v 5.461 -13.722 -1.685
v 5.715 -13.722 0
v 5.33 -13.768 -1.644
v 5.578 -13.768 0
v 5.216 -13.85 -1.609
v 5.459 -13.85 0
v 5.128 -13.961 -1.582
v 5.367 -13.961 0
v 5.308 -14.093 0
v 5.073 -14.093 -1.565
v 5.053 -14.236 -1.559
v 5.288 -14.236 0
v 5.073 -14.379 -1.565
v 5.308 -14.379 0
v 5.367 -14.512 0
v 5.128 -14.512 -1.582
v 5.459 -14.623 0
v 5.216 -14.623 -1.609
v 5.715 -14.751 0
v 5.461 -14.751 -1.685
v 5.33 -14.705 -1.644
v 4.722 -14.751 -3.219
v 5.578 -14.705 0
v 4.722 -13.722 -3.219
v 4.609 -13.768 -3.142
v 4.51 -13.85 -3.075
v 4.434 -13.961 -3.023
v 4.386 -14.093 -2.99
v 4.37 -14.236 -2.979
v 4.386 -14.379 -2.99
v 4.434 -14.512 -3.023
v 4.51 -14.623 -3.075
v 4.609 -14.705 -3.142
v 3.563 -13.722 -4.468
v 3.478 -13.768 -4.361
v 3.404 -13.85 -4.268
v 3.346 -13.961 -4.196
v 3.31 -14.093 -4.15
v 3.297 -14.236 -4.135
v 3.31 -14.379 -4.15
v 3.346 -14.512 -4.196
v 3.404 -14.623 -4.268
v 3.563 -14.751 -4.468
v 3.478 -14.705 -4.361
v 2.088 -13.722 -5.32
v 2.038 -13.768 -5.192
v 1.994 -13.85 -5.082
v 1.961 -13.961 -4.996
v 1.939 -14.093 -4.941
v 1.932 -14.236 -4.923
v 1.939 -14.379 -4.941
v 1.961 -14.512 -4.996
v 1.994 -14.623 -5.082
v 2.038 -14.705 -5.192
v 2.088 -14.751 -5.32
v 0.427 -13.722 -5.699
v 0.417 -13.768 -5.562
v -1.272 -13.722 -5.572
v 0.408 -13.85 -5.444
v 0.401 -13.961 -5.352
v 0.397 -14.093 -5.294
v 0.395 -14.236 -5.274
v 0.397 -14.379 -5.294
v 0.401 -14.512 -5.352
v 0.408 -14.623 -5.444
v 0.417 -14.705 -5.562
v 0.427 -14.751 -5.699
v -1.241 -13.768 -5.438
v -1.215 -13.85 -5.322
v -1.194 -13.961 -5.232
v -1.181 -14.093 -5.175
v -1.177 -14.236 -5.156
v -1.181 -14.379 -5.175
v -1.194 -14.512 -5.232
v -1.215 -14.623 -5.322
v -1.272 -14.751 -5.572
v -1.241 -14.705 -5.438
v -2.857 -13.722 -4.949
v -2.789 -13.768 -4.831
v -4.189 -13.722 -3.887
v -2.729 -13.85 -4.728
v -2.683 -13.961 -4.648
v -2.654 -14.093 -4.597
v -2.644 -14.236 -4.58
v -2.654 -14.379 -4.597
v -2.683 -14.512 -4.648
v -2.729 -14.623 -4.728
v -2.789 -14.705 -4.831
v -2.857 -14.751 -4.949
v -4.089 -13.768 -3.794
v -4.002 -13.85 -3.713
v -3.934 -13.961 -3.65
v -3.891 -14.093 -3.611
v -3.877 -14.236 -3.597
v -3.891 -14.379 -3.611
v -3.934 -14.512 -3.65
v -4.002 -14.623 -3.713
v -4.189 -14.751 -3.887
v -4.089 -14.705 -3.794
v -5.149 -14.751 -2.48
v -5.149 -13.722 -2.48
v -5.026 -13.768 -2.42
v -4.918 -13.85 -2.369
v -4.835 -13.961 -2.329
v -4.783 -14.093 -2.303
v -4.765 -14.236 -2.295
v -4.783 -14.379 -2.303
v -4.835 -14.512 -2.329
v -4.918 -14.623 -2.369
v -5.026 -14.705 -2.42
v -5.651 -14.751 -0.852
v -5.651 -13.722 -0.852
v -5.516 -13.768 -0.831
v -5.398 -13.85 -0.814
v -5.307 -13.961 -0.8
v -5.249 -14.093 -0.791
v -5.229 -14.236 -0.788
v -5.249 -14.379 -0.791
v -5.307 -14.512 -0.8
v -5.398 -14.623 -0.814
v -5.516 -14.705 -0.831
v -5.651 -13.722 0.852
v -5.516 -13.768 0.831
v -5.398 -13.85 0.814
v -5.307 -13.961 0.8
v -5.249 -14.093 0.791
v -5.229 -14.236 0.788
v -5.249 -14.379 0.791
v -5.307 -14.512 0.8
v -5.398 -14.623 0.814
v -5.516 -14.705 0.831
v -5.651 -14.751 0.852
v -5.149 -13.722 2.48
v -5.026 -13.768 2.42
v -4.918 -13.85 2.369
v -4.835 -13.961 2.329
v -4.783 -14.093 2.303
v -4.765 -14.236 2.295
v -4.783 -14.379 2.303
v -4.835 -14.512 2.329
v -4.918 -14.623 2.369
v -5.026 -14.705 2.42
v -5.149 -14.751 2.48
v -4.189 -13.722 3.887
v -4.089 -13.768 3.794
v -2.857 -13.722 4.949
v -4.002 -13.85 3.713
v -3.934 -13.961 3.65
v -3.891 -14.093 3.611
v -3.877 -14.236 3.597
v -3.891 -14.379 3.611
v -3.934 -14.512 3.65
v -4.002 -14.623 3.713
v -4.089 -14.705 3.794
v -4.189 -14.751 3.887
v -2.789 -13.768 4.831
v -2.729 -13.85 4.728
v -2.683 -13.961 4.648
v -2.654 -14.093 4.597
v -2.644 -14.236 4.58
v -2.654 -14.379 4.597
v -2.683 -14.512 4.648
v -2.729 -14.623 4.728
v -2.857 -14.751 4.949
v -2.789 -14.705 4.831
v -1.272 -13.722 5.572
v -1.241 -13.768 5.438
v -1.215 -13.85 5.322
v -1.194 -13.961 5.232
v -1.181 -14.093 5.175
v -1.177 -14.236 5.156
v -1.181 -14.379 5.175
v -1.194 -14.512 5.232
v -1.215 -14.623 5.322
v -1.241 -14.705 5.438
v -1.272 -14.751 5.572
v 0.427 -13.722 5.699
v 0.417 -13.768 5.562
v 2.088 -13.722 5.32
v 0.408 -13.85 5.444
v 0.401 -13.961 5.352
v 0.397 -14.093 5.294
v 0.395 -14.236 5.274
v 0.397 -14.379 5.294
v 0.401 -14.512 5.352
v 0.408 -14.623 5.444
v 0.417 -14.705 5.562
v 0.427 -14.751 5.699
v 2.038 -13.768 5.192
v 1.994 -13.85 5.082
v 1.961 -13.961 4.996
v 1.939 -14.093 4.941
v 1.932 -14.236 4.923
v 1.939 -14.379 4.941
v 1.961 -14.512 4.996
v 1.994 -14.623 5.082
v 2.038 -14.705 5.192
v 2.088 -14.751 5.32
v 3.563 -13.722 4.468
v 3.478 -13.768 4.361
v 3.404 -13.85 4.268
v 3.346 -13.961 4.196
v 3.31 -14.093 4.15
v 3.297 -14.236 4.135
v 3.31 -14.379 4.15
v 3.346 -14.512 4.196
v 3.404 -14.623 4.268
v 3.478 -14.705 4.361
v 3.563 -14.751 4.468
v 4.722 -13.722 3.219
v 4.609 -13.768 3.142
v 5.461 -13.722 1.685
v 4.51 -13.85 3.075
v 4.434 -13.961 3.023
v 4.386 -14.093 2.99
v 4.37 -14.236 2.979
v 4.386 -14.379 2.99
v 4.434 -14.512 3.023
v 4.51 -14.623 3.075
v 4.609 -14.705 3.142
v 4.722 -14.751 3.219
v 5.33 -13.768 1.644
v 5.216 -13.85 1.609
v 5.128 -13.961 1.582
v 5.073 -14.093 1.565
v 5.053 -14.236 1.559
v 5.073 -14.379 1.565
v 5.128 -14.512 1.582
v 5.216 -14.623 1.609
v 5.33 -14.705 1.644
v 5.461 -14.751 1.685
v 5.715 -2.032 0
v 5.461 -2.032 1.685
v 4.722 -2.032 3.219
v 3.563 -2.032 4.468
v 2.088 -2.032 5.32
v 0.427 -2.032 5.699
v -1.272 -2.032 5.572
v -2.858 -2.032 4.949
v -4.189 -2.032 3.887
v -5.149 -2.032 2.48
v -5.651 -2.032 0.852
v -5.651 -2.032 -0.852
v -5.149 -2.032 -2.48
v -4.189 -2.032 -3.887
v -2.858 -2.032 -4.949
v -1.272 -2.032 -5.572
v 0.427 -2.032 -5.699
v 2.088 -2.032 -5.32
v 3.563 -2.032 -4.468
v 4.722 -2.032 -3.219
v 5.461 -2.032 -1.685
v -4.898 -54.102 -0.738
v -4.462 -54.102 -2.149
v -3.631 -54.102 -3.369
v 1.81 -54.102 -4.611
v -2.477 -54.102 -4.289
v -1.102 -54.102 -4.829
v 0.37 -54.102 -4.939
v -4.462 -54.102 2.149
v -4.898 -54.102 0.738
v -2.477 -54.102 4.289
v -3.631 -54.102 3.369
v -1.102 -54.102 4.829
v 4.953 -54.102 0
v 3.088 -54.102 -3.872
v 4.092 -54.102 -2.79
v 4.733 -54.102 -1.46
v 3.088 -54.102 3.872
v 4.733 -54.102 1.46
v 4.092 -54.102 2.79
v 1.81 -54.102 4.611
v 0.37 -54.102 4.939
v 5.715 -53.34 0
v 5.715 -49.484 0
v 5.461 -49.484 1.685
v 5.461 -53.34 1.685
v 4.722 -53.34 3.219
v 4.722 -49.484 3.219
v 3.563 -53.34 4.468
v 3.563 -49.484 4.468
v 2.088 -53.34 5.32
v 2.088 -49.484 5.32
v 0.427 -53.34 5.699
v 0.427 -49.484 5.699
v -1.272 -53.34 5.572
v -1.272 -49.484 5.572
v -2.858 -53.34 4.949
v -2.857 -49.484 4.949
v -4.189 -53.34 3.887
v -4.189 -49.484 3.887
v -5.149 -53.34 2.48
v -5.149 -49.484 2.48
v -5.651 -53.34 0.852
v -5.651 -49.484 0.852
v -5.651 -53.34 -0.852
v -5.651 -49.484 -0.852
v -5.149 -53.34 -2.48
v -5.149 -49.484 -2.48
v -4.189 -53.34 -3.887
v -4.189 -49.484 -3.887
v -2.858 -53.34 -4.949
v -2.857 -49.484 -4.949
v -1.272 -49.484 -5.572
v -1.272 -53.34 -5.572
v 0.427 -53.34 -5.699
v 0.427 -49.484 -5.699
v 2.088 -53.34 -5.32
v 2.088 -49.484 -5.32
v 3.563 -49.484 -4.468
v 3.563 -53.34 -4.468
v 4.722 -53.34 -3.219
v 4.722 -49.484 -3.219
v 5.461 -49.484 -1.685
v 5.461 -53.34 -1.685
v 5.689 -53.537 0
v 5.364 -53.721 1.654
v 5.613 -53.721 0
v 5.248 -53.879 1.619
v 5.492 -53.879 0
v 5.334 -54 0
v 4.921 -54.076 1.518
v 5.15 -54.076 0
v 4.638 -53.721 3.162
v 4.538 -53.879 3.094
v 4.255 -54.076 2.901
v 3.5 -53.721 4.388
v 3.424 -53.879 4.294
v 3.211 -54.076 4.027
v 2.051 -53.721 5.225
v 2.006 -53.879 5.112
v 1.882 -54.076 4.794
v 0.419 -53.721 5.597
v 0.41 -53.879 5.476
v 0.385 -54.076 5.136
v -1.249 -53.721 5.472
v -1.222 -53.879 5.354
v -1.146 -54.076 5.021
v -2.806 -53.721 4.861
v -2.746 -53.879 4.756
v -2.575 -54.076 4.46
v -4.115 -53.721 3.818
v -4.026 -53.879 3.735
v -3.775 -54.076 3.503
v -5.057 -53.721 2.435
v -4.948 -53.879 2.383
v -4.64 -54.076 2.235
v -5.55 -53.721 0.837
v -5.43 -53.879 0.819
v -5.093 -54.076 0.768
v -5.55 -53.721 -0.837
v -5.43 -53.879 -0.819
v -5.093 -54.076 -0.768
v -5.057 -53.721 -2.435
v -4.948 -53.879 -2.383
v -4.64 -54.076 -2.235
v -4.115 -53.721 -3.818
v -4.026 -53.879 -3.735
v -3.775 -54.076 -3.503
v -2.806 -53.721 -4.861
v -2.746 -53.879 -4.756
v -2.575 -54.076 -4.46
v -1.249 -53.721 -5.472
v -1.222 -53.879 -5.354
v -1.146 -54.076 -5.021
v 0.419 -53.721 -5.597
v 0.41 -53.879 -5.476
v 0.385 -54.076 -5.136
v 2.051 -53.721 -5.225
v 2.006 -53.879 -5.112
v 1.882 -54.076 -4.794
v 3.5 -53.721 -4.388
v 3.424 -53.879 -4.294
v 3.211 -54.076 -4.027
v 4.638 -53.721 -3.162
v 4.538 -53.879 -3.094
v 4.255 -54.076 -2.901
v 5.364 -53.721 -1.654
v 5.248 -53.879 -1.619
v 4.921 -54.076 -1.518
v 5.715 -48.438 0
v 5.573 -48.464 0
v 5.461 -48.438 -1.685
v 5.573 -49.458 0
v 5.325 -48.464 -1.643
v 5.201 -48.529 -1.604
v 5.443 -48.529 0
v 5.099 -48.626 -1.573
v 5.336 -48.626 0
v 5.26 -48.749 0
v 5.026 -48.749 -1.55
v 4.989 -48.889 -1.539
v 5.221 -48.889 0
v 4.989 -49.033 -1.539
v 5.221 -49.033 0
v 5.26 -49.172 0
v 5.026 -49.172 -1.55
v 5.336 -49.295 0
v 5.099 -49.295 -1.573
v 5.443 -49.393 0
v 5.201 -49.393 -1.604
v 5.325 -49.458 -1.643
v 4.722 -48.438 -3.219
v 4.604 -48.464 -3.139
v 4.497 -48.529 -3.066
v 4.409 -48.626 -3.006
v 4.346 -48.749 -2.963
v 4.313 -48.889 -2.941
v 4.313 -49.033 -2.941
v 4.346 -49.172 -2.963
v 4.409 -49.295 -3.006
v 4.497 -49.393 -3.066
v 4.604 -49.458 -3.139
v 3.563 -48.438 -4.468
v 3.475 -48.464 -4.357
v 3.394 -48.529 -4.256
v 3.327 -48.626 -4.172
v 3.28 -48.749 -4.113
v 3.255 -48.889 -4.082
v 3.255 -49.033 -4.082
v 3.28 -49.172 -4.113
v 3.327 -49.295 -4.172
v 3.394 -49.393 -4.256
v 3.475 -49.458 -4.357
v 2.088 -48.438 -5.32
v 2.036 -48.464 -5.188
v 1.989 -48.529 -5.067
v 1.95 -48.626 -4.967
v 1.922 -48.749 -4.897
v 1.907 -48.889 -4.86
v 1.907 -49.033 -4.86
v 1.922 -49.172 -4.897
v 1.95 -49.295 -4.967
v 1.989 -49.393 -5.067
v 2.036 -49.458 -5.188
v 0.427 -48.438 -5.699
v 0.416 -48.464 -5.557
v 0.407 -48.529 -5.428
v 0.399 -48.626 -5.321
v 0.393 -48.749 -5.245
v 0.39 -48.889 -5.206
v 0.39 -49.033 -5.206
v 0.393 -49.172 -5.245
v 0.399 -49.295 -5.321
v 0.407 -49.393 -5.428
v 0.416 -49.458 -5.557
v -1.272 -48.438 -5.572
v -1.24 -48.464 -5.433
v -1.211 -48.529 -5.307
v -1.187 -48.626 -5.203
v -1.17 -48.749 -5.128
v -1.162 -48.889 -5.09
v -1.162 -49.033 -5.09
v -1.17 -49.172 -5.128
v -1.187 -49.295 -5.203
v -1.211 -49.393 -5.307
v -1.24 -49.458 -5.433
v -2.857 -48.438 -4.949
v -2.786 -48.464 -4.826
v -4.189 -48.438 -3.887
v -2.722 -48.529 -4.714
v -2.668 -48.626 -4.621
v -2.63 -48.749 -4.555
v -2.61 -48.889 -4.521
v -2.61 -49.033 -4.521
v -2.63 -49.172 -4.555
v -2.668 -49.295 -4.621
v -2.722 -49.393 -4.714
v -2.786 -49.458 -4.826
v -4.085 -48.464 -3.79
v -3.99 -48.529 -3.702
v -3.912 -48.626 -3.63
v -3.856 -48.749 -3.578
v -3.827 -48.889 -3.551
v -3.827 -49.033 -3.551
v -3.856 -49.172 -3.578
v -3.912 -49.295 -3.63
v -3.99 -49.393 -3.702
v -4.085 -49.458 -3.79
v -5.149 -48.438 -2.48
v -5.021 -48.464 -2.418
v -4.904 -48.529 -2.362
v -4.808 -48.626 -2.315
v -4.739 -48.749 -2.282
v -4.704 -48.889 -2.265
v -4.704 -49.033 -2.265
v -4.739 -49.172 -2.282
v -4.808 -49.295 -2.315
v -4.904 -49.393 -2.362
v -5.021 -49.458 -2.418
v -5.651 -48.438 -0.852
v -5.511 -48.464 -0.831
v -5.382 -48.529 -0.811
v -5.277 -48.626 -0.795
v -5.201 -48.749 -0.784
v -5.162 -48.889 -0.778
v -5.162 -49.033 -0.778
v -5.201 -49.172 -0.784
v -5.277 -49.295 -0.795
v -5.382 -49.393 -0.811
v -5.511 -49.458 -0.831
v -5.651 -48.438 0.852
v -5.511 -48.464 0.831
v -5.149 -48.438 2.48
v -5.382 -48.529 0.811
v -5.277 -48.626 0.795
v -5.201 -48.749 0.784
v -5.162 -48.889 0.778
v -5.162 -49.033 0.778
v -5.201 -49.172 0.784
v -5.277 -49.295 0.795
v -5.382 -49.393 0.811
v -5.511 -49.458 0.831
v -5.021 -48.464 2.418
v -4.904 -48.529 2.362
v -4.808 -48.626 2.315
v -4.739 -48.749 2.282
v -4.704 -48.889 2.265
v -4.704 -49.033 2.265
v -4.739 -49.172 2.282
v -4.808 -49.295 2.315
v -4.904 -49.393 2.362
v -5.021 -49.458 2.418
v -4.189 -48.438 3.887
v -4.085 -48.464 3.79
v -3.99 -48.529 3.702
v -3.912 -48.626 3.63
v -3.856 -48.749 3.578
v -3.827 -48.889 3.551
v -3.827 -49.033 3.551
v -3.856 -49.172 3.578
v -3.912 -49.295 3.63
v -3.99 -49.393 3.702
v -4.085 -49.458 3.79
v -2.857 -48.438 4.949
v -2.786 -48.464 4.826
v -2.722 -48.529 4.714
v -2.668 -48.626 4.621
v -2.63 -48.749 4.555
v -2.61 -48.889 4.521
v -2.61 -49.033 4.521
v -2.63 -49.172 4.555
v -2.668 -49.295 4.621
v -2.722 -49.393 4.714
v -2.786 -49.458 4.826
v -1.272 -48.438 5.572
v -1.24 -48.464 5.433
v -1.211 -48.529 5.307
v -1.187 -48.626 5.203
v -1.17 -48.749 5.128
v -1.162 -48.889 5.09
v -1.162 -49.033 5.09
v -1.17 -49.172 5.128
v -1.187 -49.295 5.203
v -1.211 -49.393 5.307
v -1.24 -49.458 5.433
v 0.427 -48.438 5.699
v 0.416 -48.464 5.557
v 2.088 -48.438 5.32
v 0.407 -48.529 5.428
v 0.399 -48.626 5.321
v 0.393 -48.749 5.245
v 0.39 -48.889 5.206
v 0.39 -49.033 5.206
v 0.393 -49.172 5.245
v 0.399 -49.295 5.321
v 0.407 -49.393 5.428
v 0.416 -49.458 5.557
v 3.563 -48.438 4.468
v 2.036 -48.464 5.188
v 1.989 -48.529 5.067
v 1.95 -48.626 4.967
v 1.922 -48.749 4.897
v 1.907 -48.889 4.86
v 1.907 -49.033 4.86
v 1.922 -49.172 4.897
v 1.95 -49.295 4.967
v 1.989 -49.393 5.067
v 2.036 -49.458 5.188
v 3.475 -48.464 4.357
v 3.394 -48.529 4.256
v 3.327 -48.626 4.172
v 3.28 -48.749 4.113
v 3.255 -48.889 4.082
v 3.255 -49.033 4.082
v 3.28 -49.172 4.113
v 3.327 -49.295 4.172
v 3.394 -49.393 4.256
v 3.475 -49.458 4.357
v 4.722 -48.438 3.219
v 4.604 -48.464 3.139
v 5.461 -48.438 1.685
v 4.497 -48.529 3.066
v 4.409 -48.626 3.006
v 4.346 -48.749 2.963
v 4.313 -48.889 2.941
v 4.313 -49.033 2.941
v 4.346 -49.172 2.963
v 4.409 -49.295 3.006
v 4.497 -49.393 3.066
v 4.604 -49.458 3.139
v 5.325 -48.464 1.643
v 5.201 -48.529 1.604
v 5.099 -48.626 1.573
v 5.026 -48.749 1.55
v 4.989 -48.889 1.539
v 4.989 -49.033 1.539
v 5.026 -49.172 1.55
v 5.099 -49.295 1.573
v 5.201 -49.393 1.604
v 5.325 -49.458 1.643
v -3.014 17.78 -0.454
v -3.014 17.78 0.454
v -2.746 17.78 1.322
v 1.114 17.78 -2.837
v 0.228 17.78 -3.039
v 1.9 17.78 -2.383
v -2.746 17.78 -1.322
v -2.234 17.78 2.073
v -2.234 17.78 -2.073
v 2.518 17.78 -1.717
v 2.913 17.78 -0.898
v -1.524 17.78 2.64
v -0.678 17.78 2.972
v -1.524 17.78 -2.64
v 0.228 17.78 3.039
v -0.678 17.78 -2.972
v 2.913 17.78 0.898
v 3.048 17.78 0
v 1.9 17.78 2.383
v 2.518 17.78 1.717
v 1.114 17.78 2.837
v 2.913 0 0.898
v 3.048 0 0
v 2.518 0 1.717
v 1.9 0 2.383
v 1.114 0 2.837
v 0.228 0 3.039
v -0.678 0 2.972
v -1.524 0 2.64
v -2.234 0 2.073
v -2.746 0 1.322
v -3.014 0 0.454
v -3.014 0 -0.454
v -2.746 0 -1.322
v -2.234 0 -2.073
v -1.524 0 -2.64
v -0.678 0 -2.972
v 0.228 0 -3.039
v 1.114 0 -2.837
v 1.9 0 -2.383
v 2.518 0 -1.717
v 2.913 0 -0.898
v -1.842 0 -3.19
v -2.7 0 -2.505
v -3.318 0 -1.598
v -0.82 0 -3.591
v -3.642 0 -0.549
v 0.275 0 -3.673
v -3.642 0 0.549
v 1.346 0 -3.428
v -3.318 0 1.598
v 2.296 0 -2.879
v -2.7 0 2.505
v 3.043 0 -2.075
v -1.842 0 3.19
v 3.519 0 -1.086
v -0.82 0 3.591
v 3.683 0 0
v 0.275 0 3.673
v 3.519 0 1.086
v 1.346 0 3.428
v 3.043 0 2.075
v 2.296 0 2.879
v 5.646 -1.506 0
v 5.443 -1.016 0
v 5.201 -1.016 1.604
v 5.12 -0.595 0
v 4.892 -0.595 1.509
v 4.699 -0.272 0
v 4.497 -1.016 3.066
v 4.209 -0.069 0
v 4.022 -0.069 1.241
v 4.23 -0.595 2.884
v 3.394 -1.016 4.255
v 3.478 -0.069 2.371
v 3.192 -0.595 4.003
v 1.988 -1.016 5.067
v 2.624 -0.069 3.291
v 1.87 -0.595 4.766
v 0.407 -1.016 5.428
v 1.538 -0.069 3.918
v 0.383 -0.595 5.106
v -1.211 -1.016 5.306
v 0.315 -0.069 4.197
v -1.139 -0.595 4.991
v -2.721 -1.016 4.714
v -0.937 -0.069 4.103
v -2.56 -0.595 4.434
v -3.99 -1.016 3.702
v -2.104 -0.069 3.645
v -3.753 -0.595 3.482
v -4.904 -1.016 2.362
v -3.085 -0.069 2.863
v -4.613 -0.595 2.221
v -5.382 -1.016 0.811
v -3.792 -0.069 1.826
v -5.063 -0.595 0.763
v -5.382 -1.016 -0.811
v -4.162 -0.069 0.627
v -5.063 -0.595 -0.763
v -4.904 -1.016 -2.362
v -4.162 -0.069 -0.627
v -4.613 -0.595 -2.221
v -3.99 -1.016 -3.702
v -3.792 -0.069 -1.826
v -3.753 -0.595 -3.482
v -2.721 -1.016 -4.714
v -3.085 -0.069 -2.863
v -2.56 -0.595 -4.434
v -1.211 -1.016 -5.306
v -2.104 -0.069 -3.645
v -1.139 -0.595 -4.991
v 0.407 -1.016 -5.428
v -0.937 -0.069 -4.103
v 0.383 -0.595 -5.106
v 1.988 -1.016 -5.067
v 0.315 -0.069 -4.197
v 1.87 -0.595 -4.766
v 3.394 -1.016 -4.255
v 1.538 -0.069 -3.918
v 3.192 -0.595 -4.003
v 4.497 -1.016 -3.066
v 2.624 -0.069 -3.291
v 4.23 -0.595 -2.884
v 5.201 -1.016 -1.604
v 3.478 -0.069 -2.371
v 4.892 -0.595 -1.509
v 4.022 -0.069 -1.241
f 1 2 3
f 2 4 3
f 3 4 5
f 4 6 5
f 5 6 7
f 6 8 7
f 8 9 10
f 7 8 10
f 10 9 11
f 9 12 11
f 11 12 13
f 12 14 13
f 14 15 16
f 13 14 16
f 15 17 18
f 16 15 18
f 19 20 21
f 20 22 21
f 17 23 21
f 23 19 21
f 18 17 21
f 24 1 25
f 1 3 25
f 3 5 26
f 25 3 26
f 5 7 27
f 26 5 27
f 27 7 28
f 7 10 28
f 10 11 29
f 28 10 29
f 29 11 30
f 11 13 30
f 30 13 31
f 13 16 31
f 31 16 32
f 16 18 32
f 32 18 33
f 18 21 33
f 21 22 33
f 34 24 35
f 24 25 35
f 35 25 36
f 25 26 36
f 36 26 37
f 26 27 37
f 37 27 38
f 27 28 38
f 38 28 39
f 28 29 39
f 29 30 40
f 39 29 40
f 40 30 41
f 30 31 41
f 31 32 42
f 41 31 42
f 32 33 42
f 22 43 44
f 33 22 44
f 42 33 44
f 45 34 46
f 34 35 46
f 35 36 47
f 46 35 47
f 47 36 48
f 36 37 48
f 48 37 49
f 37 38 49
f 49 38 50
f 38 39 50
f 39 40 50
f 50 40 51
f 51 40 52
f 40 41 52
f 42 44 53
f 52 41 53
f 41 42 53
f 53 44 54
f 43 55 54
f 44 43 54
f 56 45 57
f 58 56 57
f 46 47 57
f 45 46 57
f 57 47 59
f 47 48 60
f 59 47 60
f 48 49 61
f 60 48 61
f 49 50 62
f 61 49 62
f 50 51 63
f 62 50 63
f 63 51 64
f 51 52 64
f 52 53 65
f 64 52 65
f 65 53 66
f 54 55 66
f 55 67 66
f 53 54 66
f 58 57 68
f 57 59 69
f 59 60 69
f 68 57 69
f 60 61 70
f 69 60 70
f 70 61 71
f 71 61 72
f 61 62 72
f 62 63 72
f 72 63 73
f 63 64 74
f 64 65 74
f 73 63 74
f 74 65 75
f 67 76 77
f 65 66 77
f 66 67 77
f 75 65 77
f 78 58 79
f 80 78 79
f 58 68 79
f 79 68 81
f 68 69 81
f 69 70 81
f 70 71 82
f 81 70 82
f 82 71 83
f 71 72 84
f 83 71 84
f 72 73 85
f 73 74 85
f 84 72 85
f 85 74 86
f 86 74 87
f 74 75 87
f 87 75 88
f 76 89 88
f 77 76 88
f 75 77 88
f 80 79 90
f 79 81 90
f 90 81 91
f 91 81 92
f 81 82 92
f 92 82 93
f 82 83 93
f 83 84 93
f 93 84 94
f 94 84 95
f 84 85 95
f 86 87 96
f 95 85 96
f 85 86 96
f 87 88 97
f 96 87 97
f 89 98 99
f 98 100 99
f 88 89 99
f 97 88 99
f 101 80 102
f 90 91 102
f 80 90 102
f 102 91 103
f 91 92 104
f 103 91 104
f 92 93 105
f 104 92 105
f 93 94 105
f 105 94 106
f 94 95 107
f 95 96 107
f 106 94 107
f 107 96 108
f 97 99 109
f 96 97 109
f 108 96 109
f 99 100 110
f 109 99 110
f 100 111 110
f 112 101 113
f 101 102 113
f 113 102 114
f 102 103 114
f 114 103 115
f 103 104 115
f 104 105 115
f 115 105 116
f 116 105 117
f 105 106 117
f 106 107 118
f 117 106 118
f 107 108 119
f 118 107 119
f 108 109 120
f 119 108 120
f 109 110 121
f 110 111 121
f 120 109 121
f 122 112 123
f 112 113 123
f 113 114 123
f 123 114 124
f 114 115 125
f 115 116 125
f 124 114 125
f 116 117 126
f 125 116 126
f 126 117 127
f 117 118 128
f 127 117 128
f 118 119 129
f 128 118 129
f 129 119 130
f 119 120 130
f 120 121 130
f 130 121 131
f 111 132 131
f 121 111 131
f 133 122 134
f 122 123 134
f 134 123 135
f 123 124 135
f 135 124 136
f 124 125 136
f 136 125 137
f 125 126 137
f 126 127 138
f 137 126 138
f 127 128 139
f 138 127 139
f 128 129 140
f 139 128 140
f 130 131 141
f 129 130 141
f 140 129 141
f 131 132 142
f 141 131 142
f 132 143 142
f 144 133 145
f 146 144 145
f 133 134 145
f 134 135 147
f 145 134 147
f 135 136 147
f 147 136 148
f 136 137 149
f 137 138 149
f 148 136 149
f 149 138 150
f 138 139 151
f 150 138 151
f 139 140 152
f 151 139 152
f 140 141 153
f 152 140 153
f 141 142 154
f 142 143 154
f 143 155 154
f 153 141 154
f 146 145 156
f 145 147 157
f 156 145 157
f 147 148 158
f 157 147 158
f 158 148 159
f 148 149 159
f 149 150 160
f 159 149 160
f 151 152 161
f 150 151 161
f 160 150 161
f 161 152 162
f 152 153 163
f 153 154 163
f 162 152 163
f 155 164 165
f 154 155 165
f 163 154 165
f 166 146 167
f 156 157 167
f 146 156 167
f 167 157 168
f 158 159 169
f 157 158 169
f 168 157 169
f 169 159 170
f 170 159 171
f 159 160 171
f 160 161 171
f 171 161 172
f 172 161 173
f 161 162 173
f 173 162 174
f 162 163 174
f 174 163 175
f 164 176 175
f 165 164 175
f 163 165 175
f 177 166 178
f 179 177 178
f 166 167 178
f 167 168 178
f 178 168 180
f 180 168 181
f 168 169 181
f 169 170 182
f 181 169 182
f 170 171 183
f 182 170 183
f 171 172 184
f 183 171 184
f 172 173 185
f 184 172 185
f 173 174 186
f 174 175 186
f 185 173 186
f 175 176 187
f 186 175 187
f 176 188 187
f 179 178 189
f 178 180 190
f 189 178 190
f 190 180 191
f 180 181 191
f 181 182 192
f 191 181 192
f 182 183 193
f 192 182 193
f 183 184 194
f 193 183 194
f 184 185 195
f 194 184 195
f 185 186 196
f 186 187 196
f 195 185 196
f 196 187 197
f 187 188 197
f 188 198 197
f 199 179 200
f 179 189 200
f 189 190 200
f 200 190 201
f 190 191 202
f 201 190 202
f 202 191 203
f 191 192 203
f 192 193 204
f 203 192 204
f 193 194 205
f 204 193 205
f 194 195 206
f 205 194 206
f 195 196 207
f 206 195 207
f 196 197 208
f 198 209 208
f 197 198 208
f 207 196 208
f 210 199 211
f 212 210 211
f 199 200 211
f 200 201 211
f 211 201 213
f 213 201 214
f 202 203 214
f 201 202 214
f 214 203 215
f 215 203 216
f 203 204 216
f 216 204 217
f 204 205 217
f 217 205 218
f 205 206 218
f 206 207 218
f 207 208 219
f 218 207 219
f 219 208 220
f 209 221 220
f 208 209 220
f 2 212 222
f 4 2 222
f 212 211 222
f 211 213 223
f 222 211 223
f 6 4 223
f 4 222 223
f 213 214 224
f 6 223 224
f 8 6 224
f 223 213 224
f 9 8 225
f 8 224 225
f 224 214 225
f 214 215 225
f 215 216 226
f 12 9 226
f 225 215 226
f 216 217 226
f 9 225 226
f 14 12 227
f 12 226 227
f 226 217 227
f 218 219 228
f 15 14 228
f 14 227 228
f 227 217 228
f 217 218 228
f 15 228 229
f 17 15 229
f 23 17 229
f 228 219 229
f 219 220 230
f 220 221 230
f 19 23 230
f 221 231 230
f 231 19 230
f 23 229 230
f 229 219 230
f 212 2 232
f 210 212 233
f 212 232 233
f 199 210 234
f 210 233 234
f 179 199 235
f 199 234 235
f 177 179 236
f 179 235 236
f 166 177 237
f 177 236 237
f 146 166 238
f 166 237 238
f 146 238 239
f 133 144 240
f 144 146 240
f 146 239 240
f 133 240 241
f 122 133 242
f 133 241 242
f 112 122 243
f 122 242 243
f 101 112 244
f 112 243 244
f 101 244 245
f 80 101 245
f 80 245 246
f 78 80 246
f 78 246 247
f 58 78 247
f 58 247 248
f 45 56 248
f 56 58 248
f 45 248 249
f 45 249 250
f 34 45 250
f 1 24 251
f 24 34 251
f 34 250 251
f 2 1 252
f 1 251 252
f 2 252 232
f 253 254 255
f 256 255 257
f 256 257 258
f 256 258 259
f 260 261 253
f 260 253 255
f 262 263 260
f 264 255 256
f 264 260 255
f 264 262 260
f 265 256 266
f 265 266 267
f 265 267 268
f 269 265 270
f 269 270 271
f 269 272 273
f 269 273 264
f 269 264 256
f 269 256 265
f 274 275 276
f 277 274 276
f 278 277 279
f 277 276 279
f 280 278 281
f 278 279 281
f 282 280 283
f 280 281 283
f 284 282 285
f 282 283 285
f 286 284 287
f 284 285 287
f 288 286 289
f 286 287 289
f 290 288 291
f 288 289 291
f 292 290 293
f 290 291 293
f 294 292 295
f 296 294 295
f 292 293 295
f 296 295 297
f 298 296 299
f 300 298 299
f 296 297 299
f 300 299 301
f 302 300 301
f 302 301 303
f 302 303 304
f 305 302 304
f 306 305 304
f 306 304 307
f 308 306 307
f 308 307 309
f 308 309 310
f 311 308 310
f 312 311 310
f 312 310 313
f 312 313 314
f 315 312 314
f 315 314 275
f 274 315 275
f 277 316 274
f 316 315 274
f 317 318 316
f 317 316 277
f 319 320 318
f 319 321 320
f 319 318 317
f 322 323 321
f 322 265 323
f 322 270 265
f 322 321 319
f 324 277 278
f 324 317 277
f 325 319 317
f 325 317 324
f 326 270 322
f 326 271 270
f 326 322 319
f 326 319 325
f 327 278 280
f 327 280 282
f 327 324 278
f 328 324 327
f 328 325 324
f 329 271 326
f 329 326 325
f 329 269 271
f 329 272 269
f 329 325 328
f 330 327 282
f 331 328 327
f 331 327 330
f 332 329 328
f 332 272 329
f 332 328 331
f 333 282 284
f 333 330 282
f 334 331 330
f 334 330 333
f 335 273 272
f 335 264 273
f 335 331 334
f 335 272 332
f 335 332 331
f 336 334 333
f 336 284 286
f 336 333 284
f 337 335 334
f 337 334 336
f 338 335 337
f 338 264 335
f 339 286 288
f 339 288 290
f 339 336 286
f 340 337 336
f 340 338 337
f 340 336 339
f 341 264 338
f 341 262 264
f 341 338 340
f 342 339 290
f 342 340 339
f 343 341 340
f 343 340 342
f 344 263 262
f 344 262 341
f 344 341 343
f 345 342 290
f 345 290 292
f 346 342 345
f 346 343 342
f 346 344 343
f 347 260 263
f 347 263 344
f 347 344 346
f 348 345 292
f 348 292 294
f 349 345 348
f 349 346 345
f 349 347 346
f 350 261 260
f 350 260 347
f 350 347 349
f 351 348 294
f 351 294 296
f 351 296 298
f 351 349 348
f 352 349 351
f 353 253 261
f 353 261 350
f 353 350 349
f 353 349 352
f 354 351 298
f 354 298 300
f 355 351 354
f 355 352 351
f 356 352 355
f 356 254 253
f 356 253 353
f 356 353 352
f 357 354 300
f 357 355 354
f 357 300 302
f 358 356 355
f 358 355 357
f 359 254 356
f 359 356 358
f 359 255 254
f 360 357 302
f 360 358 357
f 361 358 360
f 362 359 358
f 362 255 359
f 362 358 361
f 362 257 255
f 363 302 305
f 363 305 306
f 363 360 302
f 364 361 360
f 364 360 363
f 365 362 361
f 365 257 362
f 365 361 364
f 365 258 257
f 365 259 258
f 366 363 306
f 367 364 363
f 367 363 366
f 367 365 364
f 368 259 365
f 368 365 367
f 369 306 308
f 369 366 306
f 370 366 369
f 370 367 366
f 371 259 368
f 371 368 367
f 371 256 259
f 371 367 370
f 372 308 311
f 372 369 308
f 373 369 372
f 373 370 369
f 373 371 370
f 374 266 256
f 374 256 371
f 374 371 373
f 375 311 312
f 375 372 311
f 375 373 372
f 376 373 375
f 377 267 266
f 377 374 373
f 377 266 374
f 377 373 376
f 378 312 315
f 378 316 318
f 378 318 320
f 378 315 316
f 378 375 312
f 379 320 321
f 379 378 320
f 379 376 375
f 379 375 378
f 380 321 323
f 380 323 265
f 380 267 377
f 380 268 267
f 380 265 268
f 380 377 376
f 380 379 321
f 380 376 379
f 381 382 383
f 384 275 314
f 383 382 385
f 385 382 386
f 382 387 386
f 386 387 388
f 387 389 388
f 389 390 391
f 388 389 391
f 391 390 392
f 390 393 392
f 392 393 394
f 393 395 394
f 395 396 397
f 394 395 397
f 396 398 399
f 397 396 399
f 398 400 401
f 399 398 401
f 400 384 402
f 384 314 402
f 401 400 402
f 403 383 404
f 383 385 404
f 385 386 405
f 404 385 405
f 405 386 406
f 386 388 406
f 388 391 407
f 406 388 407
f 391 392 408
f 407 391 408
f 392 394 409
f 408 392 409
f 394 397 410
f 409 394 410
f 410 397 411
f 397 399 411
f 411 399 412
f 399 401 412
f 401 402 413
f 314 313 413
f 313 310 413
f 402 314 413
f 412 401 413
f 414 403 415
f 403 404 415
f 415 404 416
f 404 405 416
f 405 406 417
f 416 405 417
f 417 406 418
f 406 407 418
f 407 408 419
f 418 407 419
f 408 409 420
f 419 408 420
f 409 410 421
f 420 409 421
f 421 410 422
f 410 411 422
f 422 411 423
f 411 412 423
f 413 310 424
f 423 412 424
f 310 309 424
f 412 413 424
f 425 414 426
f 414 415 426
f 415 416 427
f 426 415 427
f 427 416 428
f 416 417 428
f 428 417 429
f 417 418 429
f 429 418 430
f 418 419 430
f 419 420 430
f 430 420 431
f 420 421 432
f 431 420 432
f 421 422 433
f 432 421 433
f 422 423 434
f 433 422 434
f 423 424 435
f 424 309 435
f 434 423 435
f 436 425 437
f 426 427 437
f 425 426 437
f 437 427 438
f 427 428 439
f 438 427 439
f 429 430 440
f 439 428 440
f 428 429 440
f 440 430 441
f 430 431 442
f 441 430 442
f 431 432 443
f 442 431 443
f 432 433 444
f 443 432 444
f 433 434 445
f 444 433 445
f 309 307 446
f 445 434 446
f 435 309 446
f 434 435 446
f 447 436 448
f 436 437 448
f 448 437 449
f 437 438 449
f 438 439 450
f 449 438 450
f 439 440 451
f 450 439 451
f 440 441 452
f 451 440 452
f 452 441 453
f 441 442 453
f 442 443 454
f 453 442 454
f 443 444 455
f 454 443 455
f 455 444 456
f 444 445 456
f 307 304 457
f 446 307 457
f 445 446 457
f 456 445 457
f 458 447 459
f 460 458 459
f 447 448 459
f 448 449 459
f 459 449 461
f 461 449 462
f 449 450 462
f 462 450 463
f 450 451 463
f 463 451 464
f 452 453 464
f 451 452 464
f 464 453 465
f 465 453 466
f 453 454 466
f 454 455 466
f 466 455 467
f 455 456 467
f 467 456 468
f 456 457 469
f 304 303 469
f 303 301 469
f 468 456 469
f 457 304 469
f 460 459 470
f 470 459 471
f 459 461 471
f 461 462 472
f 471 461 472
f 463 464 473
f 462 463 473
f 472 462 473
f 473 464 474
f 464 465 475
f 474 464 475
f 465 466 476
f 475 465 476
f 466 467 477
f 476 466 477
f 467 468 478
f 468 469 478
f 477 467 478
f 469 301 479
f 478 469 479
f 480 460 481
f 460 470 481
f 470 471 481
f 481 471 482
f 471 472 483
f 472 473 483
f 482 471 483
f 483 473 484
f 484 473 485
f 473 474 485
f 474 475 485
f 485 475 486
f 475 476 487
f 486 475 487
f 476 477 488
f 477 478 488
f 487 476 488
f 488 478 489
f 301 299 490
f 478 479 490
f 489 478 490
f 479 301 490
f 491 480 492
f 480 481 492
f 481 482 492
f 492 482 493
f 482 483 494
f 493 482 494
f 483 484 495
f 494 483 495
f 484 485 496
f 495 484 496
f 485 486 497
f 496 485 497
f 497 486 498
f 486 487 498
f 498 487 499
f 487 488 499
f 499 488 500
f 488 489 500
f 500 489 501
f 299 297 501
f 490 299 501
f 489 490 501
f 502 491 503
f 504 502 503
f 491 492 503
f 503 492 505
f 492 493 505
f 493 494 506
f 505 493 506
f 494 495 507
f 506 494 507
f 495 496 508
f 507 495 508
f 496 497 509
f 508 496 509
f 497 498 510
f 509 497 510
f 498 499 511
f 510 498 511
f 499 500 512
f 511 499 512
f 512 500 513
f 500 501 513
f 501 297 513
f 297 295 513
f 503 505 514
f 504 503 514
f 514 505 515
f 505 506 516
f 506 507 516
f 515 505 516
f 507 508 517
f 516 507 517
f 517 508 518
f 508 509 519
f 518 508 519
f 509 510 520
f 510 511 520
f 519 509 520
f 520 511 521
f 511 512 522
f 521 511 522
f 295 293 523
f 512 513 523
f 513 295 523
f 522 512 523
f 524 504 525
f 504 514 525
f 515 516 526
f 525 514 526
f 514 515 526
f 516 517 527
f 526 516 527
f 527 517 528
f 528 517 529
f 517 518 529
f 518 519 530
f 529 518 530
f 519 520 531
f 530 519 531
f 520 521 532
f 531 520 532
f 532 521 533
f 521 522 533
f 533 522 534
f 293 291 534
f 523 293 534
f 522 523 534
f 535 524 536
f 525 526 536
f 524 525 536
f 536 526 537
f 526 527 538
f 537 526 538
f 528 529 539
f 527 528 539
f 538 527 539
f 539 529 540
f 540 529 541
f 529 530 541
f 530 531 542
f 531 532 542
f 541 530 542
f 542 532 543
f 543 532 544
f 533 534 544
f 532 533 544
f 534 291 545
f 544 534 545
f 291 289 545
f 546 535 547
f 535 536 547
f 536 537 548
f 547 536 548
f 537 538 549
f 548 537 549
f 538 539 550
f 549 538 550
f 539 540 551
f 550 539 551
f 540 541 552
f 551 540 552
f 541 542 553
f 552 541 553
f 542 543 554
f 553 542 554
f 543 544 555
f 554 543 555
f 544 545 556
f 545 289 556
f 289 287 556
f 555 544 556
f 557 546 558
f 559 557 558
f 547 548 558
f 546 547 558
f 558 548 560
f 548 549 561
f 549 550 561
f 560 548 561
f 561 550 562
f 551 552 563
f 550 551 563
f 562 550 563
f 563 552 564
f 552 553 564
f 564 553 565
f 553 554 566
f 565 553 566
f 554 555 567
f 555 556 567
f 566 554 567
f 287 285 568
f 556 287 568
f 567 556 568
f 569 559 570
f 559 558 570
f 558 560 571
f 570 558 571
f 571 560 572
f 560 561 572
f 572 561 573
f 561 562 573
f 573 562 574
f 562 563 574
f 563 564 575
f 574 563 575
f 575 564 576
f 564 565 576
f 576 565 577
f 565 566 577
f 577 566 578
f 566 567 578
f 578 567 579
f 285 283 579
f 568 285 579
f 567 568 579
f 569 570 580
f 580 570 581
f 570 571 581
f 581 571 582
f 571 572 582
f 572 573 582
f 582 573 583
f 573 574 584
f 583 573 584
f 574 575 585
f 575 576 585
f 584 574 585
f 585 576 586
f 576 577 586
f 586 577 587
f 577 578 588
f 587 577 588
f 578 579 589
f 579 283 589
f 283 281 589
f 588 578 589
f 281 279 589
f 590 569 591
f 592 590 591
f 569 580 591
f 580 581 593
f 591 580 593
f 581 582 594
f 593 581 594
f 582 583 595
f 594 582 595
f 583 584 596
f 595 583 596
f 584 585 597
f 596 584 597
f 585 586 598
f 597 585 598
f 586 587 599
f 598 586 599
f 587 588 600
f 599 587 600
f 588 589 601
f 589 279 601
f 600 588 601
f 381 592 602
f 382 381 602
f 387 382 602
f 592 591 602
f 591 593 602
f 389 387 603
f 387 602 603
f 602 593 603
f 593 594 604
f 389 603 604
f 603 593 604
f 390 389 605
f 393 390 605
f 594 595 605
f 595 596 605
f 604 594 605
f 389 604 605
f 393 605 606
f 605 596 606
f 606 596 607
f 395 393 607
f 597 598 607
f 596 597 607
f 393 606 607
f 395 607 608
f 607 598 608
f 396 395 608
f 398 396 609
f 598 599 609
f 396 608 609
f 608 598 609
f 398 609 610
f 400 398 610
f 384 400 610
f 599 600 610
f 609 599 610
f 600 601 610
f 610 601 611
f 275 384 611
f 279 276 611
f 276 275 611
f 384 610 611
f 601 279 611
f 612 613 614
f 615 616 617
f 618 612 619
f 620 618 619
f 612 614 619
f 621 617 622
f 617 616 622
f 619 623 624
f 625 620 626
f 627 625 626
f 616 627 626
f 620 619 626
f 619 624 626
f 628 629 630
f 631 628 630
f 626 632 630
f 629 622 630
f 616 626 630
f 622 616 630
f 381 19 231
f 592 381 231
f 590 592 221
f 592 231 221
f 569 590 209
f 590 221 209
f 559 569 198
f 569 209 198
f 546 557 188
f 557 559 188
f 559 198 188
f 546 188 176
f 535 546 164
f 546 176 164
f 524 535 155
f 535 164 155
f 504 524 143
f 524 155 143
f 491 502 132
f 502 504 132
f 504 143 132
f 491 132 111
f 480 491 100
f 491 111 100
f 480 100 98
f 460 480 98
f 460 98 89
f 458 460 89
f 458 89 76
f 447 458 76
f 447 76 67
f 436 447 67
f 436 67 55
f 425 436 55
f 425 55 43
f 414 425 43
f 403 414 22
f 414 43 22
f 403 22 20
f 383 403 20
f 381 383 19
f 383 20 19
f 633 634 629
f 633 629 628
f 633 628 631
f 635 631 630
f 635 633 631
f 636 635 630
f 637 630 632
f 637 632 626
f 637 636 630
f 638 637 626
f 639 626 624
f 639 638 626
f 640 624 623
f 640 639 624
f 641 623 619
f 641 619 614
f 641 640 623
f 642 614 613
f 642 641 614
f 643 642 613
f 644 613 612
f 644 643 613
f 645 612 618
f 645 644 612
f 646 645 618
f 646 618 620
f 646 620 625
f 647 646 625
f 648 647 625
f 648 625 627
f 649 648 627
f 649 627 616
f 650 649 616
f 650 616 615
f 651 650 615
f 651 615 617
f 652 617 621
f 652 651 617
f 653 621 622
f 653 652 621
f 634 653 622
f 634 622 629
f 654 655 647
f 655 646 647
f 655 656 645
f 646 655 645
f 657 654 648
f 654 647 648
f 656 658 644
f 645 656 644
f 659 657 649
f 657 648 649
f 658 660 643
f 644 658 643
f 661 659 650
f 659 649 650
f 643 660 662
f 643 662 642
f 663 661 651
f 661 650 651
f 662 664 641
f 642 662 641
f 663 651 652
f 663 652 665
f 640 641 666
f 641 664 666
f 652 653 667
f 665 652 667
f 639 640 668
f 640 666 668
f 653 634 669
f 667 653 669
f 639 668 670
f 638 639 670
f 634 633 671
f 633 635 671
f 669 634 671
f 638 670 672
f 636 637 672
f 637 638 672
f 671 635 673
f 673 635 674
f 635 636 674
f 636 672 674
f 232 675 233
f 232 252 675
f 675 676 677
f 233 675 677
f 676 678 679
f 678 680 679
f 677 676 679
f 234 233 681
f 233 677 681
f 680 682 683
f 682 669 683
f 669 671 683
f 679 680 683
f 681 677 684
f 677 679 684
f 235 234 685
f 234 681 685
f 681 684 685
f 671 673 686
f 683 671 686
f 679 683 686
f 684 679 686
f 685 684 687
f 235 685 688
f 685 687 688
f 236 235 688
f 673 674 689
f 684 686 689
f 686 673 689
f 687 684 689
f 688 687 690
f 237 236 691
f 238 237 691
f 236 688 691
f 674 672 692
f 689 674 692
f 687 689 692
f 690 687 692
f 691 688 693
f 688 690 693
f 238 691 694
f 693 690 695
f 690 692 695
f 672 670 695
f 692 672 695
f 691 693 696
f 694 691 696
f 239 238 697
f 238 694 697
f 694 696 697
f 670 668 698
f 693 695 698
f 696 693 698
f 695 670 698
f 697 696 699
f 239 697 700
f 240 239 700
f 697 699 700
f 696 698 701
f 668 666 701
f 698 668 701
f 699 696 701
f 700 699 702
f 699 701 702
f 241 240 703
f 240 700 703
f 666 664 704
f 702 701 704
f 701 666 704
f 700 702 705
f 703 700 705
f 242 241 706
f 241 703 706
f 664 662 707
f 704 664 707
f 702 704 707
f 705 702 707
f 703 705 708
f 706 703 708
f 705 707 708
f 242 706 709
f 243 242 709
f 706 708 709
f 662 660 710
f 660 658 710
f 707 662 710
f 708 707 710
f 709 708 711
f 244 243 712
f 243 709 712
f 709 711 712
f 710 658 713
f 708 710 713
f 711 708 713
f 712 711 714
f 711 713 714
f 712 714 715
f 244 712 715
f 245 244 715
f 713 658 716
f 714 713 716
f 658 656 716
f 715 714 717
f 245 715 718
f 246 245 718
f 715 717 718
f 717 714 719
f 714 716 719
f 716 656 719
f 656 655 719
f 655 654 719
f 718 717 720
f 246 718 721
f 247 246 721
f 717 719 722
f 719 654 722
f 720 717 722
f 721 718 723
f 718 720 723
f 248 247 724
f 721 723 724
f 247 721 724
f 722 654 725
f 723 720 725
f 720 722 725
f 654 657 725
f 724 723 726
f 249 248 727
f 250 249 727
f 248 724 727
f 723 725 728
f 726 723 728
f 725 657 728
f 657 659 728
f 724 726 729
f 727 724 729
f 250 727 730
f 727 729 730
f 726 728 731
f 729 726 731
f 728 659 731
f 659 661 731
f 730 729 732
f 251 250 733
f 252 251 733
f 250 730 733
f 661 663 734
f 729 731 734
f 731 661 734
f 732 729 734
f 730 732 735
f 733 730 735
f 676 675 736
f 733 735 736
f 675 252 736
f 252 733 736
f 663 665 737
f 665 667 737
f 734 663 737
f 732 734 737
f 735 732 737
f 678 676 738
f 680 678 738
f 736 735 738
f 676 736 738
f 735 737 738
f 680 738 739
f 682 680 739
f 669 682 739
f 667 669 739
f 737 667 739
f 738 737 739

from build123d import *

# Parameters (mm, degrees)
F0_R     = 5.715
F1_DEPTH = 54.102
F2_R     = 3.048
F3_DEPTH = 17.78
F4_R     = 2.032
F5_R     = 0.762
F6_R     = 0.523923
F6_R_2   = 0.523782


with BuildPart() as f1:
    # F0 (on Front) → F1 (new body)
    with BuildSketch(Plane.XZ):
        Circle(F0_R)
    extrude(amount=F1_DEPTH)

    # F2 (on Front) → F3 (join)
    with BuildSketch(Plane.XZ):
        Circle(F2_R)
    extrude(amount=-F3_DEPTH)

    # F4
    f4_edges = [f1.edges().sort_by_distance(p)[0] for p in [
        (-5.715, 0, 0),
    ]]
    fillet(f4_edges, radius=F4_R)

    # F5
    f5_edges = [f1.edges().sort_by_distance(p)[0] for p in [
        (-5.715, -54.102, 0),
    ]]
    fillet(f5_edges, radius=F5_R)

    # F6 (on Top) → F7 (revolve, cut)
    with BuildSketch(Plane.XY):
        with Locations((5.73946, -48.960872)):
            Circle(F6_R)
        with Locations((5.812218, -14.236228)):
            Circle(F6_R_2)
    revolve(axis=Axis((0, -36.495245, 0), (0, 1, 0)), mode=Mode.SUBTRACT)


solid = f1.part
